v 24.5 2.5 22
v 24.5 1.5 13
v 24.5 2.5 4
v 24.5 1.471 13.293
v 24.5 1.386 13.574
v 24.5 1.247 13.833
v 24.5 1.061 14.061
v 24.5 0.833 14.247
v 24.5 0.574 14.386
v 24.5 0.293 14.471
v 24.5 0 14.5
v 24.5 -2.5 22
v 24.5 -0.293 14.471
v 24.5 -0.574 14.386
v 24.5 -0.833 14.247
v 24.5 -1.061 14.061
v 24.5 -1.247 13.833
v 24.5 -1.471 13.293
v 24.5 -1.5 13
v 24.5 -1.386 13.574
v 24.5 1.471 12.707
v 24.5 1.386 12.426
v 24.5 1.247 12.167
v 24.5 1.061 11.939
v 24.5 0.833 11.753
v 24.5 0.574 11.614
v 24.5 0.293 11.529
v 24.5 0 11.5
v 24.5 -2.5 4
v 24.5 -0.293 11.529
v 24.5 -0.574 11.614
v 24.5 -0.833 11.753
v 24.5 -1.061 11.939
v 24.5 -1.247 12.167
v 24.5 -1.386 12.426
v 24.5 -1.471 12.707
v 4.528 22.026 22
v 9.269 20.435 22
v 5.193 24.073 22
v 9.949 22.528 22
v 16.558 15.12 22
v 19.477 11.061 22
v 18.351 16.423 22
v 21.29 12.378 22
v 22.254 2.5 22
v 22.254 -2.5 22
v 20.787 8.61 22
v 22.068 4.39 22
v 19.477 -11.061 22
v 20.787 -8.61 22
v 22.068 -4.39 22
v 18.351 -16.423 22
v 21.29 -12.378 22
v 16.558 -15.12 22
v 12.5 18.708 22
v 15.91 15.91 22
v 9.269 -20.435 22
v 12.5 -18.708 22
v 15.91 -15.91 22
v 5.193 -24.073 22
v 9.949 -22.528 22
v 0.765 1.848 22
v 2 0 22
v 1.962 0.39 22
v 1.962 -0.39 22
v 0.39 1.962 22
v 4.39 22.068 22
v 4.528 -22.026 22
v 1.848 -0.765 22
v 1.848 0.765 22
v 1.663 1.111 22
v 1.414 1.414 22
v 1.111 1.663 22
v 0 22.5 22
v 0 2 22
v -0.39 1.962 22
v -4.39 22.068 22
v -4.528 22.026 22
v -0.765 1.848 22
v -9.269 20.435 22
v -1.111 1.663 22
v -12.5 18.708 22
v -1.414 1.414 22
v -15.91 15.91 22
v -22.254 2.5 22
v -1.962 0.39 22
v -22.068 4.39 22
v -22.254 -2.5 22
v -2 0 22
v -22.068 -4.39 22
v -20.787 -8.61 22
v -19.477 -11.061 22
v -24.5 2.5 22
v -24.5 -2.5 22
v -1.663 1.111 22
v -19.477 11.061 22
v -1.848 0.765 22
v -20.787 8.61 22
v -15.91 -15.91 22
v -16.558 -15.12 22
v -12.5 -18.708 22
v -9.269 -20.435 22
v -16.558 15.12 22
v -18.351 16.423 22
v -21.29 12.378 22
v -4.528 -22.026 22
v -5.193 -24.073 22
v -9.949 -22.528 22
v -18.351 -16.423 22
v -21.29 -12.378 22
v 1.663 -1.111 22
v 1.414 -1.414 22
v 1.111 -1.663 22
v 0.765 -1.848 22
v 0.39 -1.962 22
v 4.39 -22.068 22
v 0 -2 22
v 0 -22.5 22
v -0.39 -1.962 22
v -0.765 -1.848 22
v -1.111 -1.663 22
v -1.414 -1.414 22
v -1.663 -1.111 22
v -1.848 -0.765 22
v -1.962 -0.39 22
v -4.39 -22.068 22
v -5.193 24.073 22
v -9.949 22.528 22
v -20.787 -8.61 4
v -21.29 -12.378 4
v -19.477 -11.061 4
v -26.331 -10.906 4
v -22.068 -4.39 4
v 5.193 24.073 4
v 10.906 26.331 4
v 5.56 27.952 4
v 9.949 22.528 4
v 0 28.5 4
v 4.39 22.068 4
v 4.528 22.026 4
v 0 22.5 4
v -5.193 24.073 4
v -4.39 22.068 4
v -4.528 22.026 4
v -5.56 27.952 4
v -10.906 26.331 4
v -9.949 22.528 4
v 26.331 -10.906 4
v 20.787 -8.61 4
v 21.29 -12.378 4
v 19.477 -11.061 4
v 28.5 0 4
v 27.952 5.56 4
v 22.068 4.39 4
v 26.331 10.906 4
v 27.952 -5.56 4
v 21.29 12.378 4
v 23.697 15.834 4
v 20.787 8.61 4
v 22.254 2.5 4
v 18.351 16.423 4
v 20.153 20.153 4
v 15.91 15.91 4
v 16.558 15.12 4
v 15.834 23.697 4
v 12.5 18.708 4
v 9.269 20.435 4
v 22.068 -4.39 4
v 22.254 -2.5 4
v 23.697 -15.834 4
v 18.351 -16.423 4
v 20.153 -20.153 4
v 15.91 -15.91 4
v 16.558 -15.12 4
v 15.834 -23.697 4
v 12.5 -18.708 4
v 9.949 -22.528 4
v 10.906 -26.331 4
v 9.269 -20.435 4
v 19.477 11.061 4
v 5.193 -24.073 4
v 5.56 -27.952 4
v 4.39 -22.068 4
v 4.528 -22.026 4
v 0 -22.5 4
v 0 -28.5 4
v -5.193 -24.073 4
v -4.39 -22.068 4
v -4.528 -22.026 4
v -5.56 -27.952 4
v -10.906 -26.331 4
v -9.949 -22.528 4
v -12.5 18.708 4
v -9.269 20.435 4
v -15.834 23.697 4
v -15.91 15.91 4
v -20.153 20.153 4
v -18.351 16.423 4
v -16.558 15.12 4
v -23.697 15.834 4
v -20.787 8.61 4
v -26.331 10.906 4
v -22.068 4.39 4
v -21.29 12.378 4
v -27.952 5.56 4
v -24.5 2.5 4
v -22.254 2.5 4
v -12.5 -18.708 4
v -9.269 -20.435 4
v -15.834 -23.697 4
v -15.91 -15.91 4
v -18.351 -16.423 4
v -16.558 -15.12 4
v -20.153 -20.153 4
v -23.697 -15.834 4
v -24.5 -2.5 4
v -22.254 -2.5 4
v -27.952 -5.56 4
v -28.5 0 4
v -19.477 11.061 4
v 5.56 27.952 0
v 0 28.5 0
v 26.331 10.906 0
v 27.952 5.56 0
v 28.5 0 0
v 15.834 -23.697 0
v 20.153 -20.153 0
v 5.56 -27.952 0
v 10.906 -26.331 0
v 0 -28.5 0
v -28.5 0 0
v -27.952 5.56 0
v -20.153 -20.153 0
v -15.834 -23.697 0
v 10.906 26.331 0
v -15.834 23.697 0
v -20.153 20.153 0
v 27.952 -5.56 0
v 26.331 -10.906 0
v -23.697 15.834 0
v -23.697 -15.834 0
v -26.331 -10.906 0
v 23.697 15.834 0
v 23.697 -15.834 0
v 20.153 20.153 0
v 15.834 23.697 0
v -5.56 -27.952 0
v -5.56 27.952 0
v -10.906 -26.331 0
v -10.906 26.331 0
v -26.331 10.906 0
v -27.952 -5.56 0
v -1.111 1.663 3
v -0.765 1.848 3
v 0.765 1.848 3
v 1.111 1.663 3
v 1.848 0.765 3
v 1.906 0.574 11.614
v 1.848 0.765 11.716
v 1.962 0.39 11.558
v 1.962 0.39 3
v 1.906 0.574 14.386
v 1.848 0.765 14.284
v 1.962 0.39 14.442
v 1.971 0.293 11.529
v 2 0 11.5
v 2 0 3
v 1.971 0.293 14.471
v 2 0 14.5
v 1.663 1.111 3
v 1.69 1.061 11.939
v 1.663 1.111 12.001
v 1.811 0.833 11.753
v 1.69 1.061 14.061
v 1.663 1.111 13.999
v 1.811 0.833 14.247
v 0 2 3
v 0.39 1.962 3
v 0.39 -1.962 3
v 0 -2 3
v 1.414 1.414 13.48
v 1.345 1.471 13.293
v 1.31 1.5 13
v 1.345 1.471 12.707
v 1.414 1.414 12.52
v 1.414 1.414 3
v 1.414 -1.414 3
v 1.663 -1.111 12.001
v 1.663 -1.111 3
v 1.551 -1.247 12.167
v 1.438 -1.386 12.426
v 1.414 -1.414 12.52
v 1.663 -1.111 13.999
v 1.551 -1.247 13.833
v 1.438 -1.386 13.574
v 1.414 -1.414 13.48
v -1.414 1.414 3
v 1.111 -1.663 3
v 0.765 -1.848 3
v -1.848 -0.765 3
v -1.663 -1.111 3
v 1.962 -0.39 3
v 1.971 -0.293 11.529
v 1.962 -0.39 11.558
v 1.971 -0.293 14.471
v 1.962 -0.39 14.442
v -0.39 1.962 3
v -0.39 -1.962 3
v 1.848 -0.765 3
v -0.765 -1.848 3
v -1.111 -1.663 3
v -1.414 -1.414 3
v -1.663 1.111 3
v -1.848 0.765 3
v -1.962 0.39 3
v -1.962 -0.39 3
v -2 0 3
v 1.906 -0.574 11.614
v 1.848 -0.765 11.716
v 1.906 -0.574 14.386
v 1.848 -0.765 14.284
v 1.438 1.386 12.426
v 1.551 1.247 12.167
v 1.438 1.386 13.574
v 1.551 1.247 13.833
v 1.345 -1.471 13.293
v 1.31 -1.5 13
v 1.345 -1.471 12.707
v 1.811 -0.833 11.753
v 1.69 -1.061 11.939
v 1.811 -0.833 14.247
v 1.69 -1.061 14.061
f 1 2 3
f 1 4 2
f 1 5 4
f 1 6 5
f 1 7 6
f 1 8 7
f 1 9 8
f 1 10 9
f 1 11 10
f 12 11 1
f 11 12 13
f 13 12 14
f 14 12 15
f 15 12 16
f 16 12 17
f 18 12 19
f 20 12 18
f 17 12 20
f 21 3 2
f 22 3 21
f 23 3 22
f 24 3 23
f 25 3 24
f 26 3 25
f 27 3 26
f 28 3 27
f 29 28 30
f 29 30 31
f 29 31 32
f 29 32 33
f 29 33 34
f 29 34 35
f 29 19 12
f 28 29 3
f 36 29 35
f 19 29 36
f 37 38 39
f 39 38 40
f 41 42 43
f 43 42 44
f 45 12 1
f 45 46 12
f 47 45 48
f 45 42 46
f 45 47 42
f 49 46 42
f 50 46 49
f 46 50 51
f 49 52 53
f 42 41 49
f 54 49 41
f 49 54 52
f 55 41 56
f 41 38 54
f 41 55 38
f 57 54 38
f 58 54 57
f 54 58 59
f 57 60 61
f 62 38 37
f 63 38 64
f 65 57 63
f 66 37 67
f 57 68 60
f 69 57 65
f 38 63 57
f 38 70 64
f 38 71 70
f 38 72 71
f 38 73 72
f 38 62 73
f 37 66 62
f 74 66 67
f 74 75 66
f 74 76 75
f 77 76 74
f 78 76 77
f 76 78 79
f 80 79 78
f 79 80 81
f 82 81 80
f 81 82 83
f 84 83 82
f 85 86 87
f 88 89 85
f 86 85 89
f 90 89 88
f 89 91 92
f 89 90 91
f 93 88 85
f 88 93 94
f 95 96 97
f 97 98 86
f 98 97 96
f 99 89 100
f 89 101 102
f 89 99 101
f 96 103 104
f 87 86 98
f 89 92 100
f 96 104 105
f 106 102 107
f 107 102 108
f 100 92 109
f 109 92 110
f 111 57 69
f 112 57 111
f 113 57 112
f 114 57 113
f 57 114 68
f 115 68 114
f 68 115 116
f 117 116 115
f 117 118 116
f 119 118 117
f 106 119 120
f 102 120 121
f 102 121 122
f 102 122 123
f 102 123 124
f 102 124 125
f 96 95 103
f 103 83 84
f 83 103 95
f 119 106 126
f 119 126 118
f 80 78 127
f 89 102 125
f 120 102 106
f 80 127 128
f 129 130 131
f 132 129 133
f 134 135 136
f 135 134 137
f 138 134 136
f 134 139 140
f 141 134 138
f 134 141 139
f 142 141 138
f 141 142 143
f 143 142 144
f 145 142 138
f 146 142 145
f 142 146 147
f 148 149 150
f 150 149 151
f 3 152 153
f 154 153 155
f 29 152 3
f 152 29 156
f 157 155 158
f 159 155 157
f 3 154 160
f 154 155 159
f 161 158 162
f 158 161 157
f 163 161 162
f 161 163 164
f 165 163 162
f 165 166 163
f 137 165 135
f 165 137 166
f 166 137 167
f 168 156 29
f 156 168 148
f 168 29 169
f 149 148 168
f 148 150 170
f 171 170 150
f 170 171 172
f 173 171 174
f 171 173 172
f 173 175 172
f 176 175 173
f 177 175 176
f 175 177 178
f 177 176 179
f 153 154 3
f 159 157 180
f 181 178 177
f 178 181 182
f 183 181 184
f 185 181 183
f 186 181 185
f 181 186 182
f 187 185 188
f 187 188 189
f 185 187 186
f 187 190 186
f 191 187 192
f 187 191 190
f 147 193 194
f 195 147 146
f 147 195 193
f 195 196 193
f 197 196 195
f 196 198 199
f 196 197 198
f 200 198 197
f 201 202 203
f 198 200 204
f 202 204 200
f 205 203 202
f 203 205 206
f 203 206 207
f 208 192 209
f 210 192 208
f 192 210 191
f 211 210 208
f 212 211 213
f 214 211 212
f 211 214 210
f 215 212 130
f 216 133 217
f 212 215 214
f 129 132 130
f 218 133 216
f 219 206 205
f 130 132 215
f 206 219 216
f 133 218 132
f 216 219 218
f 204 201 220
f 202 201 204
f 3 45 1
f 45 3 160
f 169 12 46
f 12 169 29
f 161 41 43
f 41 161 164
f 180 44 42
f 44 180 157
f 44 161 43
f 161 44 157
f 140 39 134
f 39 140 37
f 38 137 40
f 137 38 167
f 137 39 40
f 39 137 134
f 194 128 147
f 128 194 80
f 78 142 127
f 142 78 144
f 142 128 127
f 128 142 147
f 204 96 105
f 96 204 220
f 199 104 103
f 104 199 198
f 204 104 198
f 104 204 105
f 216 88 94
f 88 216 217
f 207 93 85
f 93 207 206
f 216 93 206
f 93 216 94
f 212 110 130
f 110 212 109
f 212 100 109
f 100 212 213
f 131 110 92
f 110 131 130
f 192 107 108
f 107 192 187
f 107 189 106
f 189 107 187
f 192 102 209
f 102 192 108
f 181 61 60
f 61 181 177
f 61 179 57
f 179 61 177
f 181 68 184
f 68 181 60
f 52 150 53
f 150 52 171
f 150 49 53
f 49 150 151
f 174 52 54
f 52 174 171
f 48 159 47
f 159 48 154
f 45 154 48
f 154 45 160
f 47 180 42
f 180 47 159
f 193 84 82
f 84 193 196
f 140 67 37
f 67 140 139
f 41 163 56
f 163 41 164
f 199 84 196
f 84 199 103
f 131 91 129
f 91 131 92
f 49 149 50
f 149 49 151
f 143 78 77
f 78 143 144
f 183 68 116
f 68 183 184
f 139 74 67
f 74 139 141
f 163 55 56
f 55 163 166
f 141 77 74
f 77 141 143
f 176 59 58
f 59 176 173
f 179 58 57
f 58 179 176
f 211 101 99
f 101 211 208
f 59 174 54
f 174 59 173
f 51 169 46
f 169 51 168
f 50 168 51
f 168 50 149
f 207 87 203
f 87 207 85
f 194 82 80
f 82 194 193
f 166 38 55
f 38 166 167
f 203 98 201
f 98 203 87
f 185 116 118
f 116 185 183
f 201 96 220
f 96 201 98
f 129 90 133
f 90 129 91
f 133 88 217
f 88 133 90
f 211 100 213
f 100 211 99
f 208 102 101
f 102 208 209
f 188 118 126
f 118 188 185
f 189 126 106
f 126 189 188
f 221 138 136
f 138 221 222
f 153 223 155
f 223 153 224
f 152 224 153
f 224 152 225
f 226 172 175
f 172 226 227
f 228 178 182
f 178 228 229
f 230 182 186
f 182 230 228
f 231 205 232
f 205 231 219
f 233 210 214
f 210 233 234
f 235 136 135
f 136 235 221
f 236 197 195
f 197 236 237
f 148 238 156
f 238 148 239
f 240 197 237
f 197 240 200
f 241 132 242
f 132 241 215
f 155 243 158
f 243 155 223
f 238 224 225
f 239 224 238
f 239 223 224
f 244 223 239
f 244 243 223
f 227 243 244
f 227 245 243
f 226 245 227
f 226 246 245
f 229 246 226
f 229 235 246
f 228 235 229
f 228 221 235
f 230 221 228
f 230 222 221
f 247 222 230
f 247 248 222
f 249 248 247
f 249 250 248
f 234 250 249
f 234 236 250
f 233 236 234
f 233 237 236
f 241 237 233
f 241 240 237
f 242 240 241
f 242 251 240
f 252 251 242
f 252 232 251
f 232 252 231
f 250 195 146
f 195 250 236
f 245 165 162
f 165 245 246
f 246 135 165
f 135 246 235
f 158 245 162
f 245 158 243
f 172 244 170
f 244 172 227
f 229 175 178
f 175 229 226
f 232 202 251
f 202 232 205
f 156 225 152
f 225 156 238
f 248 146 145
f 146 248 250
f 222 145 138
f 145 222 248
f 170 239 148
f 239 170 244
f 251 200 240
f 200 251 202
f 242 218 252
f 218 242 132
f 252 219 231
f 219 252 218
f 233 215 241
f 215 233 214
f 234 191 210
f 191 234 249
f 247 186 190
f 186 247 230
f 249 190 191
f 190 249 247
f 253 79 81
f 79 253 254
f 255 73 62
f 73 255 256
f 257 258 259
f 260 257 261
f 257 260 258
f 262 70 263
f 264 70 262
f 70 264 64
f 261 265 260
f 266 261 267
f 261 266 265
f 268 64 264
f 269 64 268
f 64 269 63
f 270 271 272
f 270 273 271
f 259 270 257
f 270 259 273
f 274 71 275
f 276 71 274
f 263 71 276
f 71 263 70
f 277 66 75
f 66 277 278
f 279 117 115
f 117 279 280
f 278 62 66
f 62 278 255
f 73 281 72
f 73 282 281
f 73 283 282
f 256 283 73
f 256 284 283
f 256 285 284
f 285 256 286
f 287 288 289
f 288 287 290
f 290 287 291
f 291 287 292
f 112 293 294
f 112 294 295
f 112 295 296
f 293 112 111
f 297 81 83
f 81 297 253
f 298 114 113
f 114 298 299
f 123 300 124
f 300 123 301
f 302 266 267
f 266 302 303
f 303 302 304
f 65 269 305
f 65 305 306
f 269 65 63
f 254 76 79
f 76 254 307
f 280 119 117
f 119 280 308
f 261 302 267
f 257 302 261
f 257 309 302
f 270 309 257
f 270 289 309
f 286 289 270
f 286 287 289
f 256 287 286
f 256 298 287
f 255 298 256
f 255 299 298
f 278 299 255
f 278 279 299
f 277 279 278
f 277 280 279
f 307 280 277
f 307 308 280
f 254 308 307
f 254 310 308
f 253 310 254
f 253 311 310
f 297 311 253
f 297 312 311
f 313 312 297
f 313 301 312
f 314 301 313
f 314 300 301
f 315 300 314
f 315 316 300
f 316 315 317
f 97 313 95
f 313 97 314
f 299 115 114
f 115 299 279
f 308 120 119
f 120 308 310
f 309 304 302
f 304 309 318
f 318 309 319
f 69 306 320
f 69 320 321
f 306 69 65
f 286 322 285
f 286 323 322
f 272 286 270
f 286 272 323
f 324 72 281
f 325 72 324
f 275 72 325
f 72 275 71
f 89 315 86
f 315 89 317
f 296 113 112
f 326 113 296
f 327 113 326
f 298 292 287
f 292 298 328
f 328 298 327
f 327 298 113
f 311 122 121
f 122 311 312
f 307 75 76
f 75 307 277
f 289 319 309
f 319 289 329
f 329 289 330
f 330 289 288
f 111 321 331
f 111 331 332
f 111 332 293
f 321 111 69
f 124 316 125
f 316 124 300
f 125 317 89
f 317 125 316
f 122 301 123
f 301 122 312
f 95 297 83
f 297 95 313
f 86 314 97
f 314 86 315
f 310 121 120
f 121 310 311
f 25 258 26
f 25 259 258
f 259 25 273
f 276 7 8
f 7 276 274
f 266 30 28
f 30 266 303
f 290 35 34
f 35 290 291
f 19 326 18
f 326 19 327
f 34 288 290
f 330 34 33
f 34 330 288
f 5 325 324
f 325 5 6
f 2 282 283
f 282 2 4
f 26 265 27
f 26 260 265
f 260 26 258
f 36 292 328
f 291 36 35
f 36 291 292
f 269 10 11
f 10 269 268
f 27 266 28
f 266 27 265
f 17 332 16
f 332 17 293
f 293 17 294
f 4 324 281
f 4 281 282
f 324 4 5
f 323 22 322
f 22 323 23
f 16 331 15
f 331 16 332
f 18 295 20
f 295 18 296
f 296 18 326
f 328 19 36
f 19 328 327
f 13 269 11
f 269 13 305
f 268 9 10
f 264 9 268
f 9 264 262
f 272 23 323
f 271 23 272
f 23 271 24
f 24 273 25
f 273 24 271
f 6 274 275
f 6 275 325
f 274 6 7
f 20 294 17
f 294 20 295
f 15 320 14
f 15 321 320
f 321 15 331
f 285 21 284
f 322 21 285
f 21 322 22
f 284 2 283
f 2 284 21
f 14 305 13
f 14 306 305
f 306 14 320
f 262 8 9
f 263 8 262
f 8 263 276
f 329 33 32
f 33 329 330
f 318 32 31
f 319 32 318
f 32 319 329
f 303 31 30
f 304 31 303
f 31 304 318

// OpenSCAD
$fn = 32;

// ----------------------------------------------------------------------
// Control knob: skirt knob with grip ribs
// ----------------------------------------------------------------------

// --- parameters (mm) ---
skirt_d = 57;             // skirt diameter
skirt_t = 4;              // skirt thickness
rib_w = 5;                // grip rib width
rib_out = 3;              // grip rib radial protrusion
n_ribs = 10;              // number of grip ribs
knob_d = 45;              // knob body diameter
knob_h = 18;              // knob body height
bore_d = 4;               // shaft bore diameter
set_d = 3;                // set screw bore diameter

rib_step = 360 / n_ribs;  // rib angular step
total_h = skirt_t + knob_h;  // overall height

difference() {
  union() {
    translate([0, 0, skirt_t]) cylinder(h = knob_h, d = knob_d);
    cylinder(h = skirt_t, d = skirt_d);
    for (i = [0 : n_ribs - 1])
      rotate([0, 0, i * rib_step])
        translate([knob_d / 2 - 1, -rib_w / 2, skirt_t])
          cube([rib_out, rib_w, knob_h]);
  }
  translate([0, 0, skirt_t - 1]) cylinder(h = knob_h + 2, d = bore_d);
  translate([-1, 0, skirt_t + knob_h / 2]) rotate([0, 90, 0])
    cylinder(h = knob_d / 2 + bore_d / 2 + 2, d = set_d);
}
